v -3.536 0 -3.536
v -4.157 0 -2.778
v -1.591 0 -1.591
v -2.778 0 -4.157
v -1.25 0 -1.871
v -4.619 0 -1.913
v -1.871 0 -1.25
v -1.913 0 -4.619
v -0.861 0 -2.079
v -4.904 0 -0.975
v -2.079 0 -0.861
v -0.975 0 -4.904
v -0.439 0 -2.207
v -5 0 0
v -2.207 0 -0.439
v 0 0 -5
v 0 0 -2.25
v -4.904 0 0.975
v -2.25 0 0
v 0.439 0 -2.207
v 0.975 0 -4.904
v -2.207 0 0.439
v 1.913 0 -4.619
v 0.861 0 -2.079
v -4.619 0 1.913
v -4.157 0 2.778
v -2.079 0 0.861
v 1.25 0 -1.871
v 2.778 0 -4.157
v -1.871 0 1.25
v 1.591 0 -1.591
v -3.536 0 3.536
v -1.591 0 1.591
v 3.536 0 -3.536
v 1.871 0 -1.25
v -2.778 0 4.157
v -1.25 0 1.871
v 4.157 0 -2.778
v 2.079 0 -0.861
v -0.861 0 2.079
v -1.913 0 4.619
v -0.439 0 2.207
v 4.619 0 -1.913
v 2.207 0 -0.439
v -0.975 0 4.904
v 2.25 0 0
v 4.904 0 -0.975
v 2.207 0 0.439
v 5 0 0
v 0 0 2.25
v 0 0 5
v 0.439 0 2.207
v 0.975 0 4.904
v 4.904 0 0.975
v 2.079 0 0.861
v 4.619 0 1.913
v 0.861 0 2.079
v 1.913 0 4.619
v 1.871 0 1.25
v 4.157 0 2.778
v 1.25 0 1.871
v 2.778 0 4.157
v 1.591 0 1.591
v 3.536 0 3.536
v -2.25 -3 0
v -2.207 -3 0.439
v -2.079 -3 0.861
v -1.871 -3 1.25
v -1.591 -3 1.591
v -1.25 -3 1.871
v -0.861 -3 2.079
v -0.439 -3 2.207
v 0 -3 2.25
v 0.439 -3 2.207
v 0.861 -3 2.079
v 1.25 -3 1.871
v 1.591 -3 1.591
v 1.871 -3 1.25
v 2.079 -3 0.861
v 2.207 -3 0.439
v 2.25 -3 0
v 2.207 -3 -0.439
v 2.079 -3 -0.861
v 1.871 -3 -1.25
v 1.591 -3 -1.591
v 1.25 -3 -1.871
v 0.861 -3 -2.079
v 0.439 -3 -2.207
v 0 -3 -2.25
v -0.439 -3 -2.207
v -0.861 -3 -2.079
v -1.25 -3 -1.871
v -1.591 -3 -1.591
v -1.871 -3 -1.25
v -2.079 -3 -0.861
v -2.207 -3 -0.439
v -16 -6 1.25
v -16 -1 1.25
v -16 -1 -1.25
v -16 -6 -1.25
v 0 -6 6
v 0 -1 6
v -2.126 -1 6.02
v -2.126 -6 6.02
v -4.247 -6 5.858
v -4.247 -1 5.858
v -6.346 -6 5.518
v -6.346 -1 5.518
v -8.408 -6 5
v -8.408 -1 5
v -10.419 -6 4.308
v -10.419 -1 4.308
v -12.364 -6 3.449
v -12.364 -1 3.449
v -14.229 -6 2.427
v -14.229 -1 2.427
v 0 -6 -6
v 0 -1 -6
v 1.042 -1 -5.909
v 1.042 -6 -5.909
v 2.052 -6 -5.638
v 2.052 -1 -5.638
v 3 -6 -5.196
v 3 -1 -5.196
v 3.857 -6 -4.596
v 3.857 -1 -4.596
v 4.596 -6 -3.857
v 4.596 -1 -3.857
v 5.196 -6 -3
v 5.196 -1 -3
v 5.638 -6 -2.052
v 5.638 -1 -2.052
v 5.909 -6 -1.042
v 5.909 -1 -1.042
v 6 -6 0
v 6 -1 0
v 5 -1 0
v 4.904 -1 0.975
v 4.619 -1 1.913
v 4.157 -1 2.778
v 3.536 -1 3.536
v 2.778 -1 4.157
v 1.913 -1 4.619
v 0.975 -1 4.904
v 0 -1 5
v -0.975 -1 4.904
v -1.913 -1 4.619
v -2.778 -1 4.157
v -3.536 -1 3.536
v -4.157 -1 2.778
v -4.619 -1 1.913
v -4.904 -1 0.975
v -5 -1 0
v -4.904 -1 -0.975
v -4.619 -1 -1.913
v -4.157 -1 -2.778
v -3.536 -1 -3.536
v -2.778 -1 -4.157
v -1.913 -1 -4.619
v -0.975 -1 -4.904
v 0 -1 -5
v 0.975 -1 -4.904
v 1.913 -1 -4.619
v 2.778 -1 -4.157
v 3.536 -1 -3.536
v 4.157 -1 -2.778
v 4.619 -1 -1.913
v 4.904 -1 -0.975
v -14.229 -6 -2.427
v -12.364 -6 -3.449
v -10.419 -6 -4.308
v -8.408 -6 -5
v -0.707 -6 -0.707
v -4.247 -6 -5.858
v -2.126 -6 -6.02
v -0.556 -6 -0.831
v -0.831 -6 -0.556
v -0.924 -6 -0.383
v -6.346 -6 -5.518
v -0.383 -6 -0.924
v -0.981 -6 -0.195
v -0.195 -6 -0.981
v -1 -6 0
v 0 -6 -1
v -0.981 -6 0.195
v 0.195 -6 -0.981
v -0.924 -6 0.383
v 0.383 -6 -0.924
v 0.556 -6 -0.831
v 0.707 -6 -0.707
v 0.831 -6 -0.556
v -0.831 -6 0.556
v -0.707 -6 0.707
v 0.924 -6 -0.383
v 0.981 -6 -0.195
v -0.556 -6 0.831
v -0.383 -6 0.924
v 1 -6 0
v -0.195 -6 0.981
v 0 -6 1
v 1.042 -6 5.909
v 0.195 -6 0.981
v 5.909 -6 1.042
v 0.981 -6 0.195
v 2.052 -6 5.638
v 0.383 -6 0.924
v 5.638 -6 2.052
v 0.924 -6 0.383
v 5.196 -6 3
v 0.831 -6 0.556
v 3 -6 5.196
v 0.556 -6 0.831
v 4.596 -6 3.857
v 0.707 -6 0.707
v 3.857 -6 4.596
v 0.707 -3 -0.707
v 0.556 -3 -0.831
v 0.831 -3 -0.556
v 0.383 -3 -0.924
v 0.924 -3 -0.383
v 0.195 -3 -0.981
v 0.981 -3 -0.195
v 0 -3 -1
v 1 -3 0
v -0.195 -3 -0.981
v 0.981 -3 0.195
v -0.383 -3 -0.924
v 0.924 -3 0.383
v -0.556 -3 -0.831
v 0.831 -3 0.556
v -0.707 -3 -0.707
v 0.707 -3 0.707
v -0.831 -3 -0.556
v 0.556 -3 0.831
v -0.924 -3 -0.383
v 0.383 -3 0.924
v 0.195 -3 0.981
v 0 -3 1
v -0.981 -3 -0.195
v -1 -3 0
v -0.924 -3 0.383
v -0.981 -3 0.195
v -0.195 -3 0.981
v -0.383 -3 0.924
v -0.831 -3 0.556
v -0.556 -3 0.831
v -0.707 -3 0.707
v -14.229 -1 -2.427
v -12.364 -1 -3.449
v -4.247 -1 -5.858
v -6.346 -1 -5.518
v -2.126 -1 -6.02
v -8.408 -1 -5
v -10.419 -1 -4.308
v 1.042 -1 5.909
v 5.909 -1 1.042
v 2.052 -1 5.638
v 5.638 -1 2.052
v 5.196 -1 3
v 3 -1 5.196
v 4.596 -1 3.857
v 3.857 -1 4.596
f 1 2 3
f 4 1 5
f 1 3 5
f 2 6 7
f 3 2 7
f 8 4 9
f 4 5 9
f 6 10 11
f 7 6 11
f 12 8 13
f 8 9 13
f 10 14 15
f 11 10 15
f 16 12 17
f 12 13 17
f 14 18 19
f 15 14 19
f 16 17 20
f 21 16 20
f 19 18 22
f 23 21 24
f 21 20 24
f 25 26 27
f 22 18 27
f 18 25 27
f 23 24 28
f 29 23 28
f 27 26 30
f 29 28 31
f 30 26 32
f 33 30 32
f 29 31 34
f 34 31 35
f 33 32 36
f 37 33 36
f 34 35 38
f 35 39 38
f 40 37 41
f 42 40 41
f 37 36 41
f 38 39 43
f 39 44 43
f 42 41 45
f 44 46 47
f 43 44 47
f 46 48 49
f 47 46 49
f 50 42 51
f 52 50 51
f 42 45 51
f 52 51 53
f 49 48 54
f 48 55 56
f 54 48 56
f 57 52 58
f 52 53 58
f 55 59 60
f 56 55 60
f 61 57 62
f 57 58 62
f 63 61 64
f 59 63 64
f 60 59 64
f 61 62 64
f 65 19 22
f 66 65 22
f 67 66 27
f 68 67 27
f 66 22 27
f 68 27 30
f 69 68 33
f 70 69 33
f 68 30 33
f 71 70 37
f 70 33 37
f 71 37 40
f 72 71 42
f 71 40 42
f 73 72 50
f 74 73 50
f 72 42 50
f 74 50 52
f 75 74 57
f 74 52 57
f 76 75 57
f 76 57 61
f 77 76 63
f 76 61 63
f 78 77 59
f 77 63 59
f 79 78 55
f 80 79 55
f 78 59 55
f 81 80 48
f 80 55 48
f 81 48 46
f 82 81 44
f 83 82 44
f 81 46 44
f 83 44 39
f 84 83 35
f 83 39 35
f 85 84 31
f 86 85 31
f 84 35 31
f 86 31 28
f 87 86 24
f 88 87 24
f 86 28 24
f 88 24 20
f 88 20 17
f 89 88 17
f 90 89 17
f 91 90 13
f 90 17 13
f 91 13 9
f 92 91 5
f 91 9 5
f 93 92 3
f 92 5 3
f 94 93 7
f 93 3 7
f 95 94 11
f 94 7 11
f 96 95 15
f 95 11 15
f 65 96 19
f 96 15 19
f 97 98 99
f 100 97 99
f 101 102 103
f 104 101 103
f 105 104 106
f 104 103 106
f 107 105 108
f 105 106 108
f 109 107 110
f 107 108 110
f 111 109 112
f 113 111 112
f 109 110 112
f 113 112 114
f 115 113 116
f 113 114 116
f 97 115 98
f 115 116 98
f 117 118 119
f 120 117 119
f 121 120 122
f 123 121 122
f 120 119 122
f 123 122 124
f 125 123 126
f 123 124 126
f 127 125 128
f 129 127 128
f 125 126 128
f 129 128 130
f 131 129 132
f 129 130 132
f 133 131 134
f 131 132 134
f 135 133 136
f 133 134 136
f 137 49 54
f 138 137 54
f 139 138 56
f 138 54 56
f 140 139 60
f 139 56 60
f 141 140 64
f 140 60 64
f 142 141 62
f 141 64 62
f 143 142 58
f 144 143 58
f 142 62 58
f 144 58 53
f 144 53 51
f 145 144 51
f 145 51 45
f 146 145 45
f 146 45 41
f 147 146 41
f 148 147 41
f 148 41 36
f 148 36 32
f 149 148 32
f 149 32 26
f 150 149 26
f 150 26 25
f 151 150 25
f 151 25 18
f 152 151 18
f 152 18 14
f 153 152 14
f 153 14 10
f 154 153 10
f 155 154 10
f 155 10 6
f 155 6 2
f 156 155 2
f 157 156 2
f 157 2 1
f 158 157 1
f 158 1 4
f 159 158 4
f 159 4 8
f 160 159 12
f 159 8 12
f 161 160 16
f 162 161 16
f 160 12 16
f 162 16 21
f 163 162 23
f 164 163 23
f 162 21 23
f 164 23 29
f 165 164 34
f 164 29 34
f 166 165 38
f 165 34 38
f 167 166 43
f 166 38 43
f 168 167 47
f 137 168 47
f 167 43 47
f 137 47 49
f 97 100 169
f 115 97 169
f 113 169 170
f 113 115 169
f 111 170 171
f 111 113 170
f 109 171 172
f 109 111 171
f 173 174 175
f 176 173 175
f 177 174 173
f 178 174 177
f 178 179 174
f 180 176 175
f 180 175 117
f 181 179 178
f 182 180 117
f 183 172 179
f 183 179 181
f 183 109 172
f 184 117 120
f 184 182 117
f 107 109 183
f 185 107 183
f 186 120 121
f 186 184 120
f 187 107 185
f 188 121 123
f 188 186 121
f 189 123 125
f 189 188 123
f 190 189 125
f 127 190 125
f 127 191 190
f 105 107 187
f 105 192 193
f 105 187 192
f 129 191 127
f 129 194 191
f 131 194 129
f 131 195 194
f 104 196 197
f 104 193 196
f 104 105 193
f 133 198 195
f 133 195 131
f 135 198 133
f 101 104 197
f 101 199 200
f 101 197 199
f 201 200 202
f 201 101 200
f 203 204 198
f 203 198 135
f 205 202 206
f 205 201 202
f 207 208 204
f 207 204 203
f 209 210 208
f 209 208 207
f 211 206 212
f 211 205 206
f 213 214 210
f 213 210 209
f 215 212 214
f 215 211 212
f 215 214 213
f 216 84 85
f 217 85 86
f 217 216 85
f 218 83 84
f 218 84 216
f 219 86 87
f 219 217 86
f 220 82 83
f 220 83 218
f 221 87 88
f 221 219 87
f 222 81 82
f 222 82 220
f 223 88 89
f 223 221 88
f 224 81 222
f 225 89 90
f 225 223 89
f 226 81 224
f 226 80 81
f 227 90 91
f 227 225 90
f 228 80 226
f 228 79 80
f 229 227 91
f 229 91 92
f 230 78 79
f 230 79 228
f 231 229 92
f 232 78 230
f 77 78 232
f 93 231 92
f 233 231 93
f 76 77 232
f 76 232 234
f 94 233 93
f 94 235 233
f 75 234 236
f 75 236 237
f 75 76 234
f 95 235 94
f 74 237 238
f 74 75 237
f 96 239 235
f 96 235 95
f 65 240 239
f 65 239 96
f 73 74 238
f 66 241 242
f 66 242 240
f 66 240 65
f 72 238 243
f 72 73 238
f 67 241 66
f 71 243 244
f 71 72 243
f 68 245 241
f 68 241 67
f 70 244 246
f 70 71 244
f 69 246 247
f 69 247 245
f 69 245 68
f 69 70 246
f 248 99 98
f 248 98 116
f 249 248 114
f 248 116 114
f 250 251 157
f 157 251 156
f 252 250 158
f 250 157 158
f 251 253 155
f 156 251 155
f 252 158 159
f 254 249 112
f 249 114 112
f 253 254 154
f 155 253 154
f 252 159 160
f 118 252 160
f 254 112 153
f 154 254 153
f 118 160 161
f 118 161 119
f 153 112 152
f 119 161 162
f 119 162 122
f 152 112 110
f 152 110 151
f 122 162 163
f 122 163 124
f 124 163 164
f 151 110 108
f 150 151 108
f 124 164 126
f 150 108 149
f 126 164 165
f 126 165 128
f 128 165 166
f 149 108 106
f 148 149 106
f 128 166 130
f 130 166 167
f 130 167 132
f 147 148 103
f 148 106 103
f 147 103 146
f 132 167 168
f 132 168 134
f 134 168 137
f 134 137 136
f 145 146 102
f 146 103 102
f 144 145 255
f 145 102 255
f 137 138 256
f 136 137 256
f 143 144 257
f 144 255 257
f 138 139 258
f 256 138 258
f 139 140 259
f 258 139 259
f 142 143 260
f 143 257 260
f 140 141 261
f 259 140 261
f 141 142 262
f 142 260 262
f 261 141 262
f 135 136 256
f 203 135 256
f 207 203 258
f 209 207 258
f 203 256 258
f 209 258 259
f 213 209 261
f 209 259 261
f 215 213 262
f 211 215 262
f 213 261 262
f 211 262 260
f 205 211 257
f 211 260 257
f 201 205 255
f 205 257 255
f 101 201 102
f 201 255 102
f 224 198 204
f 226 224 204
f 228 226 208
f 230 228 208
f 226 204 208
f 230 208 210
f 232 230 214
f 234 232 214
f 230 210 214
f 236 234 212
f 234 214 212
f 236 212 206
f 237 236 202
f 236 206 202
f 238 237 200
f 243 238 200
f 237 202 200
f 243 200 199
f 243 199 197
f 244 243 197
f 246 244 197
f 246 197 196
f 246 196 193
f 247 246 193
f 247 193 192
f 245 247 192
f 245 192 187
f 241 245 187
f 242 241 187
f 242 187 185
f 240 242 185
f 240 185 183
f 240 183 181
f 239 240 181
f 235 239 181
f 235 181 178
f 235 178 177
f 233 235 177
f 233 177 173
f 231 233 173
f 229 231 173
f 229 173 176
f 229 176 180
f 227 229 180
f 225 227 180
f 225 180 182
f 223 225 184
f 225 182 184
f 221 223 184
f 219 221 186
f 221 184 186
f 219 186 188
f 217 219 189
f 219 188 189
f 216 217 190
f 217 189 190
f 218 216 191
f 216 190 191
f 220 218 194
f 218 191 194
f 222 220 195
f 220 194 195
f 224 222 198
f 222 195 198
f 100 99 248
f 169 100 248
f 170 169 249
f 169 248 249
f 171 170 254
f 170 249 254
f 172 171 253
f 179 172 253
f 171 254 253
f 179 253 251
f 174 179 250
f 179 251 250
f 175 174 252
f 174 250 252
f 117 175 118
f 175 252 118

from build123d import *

# Parameters (mm, degrees)
F0_R     = 5
F1_DEPTH = 1
F3_DEPTH = 5
F4_W     = 11.32601
F4_H     = 3.74272
F5_DEPTH = 5
F6_R     = 2.25
F7_DEPTH = 3
F8_R     = 1
F9_DEPTH = 25


with BuildPart() as f1:
    # F0 (on Front) → F1 (new body)
    with BuildSketch(Plane.XZ):
        Circle(F0_R)
    extrude(amount=F1_DEPTH)

    # F2 (on face) → F3 (join)
    with BuildSketch(Plane.XZ.offset(1)):
        with BuildLine():
            ThreePointArc((0, -6), (4.242641, -4.242641), (6, 0))
            ThreePointArc((6, 0), (4.242641, 4.242641), (0, 6))
            ThreePointArc((0, 6), (-3.774917, 4.66369), (-5.868347, 1.25))
            Line((-5.868347, 1.25), (4, 1.25))
            Line((4, 1.25), (4, -1.25))
            Line((4, -1.25), (-5.868347, -1.25))
            ThreePointArc((-5.868347, -1.25), (-3.774917, -4.66369), (0, -6))
        make_face()
        with BuildLine():
            ThreePointArc((-5.868347, 1.25), (-3.774917, 4.66369), (0, 6))
            ThreePointArc((0, 6), (-8.408096, 4.999638), (-16, 1.25))
            Line((-16, 1.25), (-5.868347, 1.25))
        make_face()
        with BuildLine():
            ThreePointArc((-16, -1.25), (-8.408096, -4.999638), (0, -6))
            ThreePointArc((0, -6), (-3.774917, -4.66369), (-5.868347, -1.25))
            Line((-5.868347, -1.25), (-16, -1.25))
        make_face()
        with BuildLine():
            ThreePointArc((-6, 0), (-5.966996, 0.628457), (-5.868347, 1.25))
            Line((-5.868347, 1.25), (-16, 1.25))
            Line((-16, 1.25), (-16, 0))
            Line((-16, 0), (-6, 0))
        make_face()
        with BuildLine():
            Line((-16, -1.25), (-5.868347, -1.25))
            ThreePointArc((-5.868347, -1.25), (-5.966996, -0.628457), (-6, 0))
            Line((-6, 0), (-16, 0))
            Line((-16, 0), (-16, -1.25))
        make_face()
    extrude(amount=F3_DEPTH)

    # F4 (on face) → F5 (join)
    with BuildSketch(Plane.XZ.offset(6)):
        with Locations((-1.024707, -0.007552)):
            Rectangle(F4_W, F4_H)
    extrude(amount=-F5_DEPTH)

    # F6 (on face) → F7 (cut)
    with BuildSketch(Plane(origin=(0, 0, 0), x_dir=(-1, 0, 0), z_dir=(0, 1, 0))):
        Circle(F6_R)
    extrude(amount=-F7_DEPTH, mode=Mode.SUBTRACT)

    # F8 (on face) → F9 (cut)
    with BuildSketch(Plane.XZ.offset(6)):
        Circle(F8_R)
    extrude(amount=-F9_DEPTH, mode=Mode.SUBTRACT)


solid = f1.part
